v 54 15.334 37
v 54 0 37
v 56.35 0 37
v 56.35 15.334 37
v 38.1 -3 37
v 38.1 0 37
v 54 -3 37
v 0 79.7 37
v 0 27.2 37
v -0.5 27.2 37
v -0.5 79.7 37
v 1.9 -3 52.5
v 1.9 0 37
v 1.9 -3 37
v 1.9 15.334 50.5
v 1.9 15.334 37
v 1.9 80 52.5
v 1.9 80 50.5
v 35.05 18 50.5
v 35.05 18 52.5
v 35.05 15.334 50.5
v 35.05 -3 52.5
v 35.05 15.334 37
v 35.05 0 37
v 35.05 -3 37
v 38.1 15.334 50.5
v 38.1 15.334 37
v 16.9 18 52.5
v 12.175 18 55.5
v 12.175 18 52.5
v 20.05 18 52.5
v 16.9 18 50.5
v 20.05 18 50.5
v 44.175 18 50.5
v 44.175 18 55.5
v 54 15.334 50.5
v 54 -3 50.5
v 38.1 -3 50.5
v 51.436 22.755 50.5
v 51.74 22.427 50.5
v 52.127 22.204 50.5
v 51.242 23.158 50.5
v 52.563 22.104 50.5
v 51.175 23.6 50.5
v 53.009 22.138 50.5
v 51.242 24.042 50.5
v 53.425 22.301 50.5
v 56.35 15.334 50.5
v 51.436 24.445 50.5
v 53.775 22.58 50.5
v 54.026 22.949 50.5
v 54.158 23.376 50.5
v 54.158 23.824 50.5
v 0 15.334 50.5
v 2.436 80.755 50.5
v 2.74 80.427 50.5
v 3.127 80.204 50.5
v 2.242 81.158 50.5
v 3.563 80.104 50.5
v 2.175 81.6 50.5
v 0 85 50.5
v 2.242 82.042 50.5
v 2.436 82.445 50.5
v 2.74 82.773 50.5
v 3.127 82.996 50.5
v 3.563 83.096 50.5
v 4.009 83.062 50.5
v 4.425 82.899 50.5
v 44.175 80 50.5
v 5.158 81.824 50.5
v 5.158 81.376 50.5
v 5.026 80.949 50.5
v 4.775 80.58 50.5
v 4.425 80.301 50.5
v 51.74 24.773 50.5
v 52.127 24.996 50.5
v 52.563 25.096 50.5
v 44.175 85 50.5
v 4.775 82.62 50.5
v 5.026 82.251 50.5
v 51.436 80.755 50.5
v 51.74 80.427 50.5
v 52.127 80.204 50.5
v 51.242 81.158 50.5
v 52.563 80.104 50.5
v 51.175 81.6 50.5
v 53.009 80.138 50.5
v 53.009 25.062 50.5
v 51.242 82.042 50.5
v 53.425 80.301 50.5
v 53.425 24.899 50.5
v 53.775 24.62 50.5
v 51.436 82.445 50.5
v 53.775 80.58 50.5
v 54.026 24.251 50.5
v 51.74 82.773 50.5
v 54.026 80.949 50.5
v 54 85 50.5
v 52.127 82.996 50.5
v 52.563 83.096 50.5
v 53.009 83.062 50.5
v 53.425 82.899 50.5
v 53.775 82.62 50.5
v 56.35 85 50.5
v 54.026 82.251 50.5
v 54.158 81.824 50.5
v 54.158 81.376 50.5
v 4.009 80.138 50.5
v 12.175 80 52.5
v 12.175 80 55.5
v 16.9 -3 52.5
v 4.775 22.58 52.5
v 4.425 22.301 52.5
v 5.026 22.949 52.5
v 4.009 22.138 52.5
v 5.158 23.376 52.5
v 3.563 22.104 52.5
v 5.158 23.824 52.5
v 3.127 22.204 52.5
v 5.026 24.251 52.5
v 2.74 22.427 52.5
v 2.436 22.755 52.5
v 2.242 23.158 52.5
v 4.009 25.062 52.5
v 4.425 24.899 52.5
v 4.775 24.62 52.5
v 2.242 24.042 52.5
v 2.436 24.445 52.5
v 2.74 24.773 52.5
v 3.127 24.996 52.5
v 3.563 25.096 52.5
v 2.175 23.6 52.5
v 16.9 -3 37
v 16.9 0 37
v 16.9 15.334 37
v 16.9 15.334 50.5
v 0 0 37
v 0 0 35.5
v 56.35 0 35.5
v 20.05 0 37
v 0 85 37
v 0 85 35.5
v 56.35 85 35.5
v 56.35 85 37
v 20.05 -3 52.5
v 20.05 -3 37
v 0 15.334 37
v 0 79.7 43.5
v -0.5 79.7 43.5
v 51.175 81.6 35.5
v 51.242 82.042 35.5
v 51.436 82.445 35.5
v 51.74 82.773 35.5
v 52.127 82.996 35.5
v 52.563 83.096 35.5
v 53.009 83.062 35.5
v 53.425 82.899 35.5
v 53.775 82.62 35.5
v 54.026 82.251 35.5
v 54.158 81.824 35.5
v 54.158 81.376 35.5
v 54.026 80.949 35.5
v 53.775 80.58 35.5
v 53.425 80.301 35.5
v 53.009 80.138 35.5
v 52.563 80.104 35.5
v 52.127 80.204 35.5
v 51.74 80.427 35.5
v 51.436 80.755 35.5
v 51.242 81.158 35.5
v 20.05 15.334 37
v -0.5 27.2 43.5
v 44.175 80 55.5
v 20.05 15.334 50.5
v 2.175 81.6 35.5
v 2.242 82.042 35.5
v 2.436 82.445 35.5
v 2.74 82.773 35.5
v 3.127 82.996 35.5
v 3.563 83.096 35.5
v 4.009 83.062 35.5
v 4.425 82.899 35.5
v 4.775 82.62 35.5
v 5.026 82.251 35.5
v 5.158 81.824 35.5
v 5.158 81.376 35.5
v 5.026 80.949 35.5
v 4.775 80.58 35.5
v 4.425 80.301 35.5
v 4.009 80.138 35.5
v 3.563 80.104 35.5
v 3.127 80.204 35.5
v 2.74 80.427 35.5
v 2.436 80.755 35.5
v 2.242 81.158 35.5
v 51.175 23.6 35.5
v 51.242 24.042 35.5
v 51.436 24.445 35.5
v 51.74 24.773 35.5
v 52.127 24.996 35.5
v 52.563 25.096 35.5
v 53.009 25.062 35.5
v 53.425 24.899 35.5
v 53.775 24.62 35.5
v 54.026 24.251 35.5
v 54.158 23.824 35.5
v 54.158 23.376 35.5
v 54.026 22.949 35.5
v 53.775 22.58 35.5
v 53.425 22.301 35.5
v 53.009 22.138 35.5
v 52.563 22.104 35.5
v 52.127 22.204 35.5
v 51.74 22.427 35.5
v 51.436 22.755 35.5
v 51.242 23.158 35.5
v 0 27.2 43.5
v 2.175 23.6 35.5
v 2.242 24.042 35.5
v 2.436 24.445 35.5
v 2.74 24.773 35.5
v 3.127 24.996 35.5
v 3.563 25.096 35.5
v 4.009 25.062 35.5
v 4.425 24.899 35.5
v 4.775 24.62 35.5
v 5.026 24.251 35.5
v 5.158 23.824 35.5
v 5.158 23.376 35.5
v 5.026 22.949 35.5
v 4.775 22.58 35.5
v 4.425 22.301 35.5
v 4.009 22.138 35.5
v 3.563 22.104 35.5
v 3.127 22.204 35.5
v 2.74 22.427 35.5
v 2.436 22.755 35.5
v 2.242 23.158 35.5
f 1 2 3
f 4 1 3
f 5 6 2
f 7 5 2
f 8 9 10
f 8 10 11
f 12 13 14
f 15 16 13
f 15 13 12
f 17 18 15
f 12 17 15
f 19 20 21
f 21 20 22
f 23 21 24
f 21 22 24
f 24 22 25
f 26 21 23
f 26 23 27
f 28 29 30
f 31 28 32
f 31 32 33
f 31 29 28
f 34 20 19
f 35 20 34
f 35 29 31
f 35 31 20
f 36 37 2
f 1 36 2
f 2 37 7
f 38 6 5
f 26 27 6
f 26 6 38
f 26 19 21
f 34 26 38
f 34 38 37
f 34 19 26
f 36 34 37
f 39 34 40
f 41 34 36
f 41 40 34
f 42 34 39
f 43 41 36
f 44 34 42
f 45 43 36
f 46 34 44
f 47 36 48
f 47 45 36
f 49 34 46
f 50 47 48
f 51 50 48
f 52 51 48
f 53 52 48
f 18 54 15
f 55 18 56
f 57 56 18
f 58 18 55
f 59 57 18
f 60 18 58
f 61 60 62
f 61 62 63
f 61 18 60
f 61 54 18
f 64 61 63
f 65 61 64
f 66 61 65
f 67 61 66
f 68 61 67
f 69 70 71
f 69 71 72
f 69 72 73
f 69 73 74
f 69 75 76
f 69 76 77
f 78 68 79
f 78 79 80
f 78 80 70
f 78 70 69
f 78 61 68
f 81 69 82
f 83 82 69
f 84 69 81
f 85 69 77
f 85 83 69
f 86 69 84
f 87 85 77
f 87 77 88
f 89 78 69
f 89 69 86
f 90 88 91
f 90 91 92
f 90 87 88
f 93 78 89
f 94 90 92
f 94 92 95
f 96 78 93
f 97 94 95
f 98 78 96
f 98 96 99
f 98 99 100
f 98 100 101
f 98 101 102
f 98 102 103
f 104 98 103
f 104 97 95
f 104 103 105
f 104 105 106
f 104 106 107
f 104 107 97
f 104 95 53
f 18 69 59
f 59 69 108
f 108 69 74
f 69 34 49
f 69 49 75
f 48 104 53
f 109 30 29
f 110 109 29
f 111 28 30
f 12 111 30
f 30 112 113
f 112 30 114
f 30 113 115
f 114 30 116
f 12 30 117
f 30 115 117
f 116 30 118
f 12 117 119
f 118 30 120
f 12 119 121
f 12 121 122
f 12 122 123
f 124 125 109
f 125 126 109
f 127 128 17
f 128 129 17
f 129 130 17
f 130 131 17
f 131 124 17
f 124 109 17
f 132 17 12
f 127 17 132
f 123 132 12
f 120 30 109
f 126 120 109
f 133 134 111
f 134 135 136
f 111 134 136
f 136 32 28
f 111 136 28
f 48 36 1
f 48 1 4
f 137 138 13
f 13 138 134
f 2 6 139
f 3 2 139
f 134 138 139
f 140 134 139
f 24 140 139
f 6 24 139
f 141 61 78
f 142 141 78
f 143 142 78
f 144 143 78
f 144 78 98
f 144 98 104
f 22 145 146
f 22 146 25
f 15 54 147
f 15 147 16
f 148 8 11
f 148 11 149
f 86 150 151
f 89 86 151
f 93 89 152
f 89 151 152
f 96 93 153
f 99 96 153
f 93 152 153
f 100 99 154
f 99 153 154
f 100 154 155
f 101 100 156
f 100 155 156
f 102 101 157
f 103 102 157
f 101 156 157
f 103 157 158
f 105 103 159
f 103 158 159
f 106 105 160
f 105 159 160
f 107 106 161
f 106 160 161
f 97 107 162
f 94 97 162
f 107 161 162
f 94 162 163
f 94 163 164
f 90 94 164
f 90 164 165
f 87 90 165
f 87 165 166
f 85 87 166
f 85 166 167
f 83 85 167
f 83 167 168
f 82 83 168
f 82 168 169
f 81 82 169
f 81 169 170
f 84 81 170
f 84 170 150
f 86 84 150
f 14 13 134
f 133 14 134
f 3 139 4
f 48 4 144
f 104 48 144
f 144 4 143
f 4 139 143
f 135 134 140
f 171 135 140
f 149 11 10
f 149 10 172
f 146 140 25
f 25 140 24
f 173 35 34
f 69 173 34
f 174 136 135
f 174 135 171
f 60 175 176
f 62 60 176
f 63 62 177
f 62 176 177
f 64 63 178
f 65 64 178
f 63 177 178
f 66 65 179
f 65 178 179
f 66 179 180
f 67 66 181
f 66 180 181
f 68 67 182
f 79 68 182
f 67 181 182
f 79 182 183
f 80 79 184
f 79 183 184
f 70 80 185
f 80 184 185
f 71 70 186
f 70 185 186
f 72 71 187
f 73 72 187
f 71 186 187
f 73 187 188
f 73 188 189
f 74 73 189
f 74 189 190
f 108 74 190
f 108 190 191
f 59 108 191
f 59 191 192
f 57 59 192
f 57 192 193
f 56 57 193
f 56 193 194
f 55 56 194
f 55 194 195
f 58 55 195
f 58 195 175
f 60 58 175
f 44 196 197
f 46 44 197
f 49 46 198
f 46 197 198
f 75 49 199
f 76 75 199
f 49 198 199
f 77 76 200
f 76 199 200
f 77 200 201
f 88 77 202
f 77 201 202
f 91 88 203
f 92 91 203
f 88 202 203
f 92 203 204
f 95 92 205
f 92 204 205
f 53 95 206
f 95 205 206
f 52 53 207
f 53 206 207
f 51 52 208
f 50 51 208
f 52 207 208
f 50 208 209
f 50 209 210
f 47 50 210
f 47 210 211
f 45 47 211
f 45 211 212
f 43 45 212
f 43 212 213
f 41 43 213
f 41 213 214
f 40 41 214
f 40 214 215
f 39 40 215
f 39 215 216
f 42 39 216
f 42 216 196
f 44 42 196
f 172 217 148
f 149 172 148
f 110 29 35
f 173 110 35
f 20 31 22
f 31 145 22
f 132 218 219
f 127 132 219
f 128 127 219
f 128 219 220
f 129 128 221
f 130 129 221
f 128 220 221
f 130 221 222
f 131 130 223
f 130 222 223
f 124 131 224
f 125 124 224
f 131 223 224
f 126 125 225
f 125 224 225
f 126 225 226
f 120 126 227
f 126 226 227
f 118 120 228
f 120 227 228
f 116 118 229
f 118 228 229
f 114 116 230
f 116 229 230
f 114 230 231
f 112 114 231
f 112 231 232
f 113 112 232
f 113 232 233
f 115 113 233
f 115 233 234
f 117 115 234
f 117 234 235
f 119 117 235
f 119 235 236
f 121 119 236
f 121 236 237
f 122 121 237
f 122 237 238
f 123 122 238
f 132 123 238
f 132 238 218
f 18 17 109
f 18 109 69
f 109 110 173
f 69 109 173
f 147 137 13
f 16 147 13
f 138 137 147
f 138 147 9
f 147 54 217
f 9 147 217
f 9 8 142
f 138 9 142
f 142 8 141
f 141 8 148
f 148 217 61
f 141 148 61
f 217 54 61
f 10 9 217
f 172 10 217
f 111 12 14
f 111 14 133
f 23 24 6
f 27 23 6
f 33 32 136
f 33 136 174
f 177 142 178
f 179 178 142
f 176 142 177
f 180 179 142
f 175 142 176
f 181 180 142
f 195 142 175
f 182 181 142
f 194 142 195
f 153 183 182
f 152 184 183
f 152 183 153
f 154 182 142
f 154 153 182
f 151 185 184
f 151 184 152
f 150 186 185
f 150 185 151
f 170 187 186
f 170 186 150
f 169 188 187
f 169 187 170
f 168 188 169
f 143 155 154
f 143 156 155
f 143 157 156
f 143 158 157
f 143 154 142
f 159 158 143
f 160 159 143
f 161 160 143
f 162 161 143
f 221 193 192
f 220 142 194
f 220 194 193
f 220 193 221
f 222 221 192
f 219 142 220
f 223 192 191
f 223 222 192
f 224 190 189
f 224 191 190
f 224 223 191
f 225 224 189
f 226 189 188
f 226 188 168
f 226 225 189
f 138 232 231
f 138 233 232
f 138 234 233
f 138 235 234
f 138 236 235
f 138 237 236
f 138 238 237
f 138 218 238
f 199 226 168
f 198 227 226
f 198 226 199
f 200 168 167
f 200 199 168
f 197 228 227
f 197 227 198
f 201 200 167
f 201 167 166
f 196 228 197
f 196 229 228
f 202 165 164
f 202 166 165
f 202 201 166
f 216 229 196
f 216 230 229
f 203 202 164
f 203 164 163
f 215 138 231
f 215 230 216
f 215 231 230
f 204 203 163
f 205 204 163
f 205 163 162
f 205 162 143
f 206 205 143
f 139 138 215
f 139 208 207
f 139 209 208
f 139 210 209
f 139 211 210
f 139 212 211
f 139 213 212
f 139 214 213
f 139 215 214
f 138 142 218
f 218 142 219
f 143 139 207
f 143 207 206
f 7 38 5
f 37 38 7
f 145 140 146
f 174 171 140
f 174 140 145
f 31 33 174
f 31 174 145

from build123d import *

# Parameters (mm, degrees)
SKETCH1_W           = 56.35
SKETCH1_H           = 85
BOSS_EXTRUDE1_DEPTH = 55.5
CUT_EXTRUDE3_DEPTH  = 117.105867638
CUT_EXTRUDE4_DEPTH  = 18
SKETCH2_4_W         = 10.275
SKETCH2_4_H         = 15.5
SKETCH2_4_W_2       = 4.725
SKETCH2_4_W_3       = 15
SKETCH2_4_W_4       = 6.075
SKETCH2_4_H_2       = 13.5
SKETCH2_4_W_5       = 9.825
BOSS_EXTRUDE2_DEPTH = 3
SKETCH3_W           = 6.5
SKETCH3_H           = 52.5
BOSS_EXTRUDE3_DEPTH = 2.4
SKETCH4_W           = 83.236605227
SKETCH4_H           = 41.384754339
CUT_EXTRUDE5_DEPTH  = 117.105867638
SKETCH6_W           = 56.35
SKETCH6_H           = 69.665906653
BOSS_EXTRUDE4_DEPTH = 13.5
SKETCH5_R           = 1.5
CUT_EXTRUDE6_DEPTH  = 104.924600071
SKETCH7_W           = 101.583675899
SKETCH7_H           = 36.04582048
CUT_EXTRUDE7_DEPTH  = 5


with BuildPart() as part:
    # Sketch1 → Boss-Extrude1 (new body)
    with BuildSketch(Plane.XY):
        with Locations((28.175, 42.5)):
            Rectangle(SKETCH1_W, SKETCH1_H)
    extrude(amount=BOSS_EXTRUDE1_DEPTH)

    # Sketch2 → Cut-Extrude3 (cut, through all)
    with BuildSketch(Plane.XZ):
        with BuildLine():
            Line((5.575, 25.1), (0, 25.1))
            Line((0, 25.1), (0, 0))
            Line((0, 0), (11.575, 0))
            ThreePointArc((11.575, 0), (7.332359313, 1.757359313), (5.575, 6))
            Line((5.575, 6), (5.575, 25.1))
        make_face()
        with BuildLine():
            Line((56.35, 0), (56.35, 25.1))
            Line((56.35, 25.1), (50.775, 25.1))
            Line((50.775, 25.1), (50.775, 6))
            ThreePointArc((50.775, 6), (49.017640687, 1.757359313), (44.775, 0))
            Line((44.775, 0), (56.35, 0))
        make_face()
        Polygon((56.35, 55.5), (44.175, 55.5), (44.175, 50.5), (54, 50.5), (54, 37), (56.35, 37), align=None)
        Polygon((1.9, 37), (1.9, 52.5), (12.175, 52.5), (12.175, 55.5), (0, 55.5), (0, 37), align=None)
    extrude(amount=-CUT_EXTRUDE3_DEPTH, mode=Mode.SUBTRACT)

    # Sketch2<3> → Cut-Extrude4 (cut)
    with BuildSketch(Plane.XZ):
        Polygon((12.175, 55.5), (12.175, 52.5), (16.9, 52.5), (16.9, 37), (20.05, 37), (20.05, 52.5), (35.05, 52.5), (35.05, 37), (38.1, 37), (38.1, 50.5), (44.175, 50.5), (44.175, 55.5), align=None)
    extrude(amount=-CUT_EXTRUDE4_DEPTH, mode=Mode.SUBTRACT)

    # Sketch2<4> → Boss-Extrude2 (add)
    with BuildSketch(Plane.XZ):
        with Locations((7.0375, 44.75)):
            Rectangle(SKETCH2_4_W, SKETCH2_4_H)
        with Locations((14.5375, 44.75)):
            Rectangle(SKETCH2_4_W_2, SKETCH2_4_H)
        with Locations((27.55, 44.75)):
            Rectangle(SKETCH2_4_W_3, SKETCH2_4_H)
        with Locations((41.1375, 43.75)):
            Rectangle(SKETCH2_4_W_4, SKETCH2_4_H_2)
        with Locations((49.0875, 43.75)):
            Rectangle(SKETCH2_4_W_5, SKETCH2_4_H_2)
    extrude(amount=BOSS_EXTRUDE2_DEPTH)

    # Sketch3 → Boss-Extrude3 (add)
    with BuildSketch(Plane.ZY.offset(-1.9)):
        with Locations((40.25, 53.45)):
            Rectangle(SKETCH3_W, SKETCH3_H)
        with Locations((29.75, 53.45)):
            Rectangle(SKETCH3_W, SKETCH3_H)
    extrude(amount=BOSS_EXTRUDE3_DEPTH)

    # Sketch4 → Cut-Extrude5 (cut, through all)
    with BuildSketch(Plane.XZ):
        with Locations((28.392096551, 14.80762283)):
            Rectangle(SKETCH4_W, SKETCH4_H)
    extrude(amount=-CUT_EXTRUDE5_DEPTH, mode=Mode.SUBTRACT)

    # Sketch6 → Boss-Extrude4 (add)
    with BuildSketch(Plane.XY.offset(50.5)):
        with Locations((28.175, 50.167046674)):
            Rectangle(SKETCH6_W, SKETCH6_H)
    extrude(amount=-BOSS_EXTRUDE4_DEPTH)

    # Sketch5 → Cut-Extrude6 (cut, through all)
    with BuildSketch(Plane(origin=(0, 0, 35.5), x_dir=(-1, 0, 0), z_dir=(0, 0, -1))):
        with Locations((-52.675, 81.6)):
            Circle(SKETCH5_R)
        with Locations((-3.675, 81.6)):
            Circle(SKETCH5_R)
        with Locations((-3.675, 23.6)):
            Circle(SKETCH5_R)
        with Locations((-52.675, 23.6)):
            Circle(SKETCH5_R)
    extrude(amount=-CUT_EXTRUDE6_DEPTH, mode=Mode.SUBTRACT)

    # Sketch7 → Cut-Extrude7 (cut)
    with BuildSketch(Plane.XY.offset(55.5)):
        with Locations((37.583210273, 98.02291024)):
            Rectangle(SKETCH7_W, SKETCH7_H)
    extrude(amount=-CUT_EXTRUDE7_DEPTH, mode=Mode.SUBTRACT)


solid = part.part
